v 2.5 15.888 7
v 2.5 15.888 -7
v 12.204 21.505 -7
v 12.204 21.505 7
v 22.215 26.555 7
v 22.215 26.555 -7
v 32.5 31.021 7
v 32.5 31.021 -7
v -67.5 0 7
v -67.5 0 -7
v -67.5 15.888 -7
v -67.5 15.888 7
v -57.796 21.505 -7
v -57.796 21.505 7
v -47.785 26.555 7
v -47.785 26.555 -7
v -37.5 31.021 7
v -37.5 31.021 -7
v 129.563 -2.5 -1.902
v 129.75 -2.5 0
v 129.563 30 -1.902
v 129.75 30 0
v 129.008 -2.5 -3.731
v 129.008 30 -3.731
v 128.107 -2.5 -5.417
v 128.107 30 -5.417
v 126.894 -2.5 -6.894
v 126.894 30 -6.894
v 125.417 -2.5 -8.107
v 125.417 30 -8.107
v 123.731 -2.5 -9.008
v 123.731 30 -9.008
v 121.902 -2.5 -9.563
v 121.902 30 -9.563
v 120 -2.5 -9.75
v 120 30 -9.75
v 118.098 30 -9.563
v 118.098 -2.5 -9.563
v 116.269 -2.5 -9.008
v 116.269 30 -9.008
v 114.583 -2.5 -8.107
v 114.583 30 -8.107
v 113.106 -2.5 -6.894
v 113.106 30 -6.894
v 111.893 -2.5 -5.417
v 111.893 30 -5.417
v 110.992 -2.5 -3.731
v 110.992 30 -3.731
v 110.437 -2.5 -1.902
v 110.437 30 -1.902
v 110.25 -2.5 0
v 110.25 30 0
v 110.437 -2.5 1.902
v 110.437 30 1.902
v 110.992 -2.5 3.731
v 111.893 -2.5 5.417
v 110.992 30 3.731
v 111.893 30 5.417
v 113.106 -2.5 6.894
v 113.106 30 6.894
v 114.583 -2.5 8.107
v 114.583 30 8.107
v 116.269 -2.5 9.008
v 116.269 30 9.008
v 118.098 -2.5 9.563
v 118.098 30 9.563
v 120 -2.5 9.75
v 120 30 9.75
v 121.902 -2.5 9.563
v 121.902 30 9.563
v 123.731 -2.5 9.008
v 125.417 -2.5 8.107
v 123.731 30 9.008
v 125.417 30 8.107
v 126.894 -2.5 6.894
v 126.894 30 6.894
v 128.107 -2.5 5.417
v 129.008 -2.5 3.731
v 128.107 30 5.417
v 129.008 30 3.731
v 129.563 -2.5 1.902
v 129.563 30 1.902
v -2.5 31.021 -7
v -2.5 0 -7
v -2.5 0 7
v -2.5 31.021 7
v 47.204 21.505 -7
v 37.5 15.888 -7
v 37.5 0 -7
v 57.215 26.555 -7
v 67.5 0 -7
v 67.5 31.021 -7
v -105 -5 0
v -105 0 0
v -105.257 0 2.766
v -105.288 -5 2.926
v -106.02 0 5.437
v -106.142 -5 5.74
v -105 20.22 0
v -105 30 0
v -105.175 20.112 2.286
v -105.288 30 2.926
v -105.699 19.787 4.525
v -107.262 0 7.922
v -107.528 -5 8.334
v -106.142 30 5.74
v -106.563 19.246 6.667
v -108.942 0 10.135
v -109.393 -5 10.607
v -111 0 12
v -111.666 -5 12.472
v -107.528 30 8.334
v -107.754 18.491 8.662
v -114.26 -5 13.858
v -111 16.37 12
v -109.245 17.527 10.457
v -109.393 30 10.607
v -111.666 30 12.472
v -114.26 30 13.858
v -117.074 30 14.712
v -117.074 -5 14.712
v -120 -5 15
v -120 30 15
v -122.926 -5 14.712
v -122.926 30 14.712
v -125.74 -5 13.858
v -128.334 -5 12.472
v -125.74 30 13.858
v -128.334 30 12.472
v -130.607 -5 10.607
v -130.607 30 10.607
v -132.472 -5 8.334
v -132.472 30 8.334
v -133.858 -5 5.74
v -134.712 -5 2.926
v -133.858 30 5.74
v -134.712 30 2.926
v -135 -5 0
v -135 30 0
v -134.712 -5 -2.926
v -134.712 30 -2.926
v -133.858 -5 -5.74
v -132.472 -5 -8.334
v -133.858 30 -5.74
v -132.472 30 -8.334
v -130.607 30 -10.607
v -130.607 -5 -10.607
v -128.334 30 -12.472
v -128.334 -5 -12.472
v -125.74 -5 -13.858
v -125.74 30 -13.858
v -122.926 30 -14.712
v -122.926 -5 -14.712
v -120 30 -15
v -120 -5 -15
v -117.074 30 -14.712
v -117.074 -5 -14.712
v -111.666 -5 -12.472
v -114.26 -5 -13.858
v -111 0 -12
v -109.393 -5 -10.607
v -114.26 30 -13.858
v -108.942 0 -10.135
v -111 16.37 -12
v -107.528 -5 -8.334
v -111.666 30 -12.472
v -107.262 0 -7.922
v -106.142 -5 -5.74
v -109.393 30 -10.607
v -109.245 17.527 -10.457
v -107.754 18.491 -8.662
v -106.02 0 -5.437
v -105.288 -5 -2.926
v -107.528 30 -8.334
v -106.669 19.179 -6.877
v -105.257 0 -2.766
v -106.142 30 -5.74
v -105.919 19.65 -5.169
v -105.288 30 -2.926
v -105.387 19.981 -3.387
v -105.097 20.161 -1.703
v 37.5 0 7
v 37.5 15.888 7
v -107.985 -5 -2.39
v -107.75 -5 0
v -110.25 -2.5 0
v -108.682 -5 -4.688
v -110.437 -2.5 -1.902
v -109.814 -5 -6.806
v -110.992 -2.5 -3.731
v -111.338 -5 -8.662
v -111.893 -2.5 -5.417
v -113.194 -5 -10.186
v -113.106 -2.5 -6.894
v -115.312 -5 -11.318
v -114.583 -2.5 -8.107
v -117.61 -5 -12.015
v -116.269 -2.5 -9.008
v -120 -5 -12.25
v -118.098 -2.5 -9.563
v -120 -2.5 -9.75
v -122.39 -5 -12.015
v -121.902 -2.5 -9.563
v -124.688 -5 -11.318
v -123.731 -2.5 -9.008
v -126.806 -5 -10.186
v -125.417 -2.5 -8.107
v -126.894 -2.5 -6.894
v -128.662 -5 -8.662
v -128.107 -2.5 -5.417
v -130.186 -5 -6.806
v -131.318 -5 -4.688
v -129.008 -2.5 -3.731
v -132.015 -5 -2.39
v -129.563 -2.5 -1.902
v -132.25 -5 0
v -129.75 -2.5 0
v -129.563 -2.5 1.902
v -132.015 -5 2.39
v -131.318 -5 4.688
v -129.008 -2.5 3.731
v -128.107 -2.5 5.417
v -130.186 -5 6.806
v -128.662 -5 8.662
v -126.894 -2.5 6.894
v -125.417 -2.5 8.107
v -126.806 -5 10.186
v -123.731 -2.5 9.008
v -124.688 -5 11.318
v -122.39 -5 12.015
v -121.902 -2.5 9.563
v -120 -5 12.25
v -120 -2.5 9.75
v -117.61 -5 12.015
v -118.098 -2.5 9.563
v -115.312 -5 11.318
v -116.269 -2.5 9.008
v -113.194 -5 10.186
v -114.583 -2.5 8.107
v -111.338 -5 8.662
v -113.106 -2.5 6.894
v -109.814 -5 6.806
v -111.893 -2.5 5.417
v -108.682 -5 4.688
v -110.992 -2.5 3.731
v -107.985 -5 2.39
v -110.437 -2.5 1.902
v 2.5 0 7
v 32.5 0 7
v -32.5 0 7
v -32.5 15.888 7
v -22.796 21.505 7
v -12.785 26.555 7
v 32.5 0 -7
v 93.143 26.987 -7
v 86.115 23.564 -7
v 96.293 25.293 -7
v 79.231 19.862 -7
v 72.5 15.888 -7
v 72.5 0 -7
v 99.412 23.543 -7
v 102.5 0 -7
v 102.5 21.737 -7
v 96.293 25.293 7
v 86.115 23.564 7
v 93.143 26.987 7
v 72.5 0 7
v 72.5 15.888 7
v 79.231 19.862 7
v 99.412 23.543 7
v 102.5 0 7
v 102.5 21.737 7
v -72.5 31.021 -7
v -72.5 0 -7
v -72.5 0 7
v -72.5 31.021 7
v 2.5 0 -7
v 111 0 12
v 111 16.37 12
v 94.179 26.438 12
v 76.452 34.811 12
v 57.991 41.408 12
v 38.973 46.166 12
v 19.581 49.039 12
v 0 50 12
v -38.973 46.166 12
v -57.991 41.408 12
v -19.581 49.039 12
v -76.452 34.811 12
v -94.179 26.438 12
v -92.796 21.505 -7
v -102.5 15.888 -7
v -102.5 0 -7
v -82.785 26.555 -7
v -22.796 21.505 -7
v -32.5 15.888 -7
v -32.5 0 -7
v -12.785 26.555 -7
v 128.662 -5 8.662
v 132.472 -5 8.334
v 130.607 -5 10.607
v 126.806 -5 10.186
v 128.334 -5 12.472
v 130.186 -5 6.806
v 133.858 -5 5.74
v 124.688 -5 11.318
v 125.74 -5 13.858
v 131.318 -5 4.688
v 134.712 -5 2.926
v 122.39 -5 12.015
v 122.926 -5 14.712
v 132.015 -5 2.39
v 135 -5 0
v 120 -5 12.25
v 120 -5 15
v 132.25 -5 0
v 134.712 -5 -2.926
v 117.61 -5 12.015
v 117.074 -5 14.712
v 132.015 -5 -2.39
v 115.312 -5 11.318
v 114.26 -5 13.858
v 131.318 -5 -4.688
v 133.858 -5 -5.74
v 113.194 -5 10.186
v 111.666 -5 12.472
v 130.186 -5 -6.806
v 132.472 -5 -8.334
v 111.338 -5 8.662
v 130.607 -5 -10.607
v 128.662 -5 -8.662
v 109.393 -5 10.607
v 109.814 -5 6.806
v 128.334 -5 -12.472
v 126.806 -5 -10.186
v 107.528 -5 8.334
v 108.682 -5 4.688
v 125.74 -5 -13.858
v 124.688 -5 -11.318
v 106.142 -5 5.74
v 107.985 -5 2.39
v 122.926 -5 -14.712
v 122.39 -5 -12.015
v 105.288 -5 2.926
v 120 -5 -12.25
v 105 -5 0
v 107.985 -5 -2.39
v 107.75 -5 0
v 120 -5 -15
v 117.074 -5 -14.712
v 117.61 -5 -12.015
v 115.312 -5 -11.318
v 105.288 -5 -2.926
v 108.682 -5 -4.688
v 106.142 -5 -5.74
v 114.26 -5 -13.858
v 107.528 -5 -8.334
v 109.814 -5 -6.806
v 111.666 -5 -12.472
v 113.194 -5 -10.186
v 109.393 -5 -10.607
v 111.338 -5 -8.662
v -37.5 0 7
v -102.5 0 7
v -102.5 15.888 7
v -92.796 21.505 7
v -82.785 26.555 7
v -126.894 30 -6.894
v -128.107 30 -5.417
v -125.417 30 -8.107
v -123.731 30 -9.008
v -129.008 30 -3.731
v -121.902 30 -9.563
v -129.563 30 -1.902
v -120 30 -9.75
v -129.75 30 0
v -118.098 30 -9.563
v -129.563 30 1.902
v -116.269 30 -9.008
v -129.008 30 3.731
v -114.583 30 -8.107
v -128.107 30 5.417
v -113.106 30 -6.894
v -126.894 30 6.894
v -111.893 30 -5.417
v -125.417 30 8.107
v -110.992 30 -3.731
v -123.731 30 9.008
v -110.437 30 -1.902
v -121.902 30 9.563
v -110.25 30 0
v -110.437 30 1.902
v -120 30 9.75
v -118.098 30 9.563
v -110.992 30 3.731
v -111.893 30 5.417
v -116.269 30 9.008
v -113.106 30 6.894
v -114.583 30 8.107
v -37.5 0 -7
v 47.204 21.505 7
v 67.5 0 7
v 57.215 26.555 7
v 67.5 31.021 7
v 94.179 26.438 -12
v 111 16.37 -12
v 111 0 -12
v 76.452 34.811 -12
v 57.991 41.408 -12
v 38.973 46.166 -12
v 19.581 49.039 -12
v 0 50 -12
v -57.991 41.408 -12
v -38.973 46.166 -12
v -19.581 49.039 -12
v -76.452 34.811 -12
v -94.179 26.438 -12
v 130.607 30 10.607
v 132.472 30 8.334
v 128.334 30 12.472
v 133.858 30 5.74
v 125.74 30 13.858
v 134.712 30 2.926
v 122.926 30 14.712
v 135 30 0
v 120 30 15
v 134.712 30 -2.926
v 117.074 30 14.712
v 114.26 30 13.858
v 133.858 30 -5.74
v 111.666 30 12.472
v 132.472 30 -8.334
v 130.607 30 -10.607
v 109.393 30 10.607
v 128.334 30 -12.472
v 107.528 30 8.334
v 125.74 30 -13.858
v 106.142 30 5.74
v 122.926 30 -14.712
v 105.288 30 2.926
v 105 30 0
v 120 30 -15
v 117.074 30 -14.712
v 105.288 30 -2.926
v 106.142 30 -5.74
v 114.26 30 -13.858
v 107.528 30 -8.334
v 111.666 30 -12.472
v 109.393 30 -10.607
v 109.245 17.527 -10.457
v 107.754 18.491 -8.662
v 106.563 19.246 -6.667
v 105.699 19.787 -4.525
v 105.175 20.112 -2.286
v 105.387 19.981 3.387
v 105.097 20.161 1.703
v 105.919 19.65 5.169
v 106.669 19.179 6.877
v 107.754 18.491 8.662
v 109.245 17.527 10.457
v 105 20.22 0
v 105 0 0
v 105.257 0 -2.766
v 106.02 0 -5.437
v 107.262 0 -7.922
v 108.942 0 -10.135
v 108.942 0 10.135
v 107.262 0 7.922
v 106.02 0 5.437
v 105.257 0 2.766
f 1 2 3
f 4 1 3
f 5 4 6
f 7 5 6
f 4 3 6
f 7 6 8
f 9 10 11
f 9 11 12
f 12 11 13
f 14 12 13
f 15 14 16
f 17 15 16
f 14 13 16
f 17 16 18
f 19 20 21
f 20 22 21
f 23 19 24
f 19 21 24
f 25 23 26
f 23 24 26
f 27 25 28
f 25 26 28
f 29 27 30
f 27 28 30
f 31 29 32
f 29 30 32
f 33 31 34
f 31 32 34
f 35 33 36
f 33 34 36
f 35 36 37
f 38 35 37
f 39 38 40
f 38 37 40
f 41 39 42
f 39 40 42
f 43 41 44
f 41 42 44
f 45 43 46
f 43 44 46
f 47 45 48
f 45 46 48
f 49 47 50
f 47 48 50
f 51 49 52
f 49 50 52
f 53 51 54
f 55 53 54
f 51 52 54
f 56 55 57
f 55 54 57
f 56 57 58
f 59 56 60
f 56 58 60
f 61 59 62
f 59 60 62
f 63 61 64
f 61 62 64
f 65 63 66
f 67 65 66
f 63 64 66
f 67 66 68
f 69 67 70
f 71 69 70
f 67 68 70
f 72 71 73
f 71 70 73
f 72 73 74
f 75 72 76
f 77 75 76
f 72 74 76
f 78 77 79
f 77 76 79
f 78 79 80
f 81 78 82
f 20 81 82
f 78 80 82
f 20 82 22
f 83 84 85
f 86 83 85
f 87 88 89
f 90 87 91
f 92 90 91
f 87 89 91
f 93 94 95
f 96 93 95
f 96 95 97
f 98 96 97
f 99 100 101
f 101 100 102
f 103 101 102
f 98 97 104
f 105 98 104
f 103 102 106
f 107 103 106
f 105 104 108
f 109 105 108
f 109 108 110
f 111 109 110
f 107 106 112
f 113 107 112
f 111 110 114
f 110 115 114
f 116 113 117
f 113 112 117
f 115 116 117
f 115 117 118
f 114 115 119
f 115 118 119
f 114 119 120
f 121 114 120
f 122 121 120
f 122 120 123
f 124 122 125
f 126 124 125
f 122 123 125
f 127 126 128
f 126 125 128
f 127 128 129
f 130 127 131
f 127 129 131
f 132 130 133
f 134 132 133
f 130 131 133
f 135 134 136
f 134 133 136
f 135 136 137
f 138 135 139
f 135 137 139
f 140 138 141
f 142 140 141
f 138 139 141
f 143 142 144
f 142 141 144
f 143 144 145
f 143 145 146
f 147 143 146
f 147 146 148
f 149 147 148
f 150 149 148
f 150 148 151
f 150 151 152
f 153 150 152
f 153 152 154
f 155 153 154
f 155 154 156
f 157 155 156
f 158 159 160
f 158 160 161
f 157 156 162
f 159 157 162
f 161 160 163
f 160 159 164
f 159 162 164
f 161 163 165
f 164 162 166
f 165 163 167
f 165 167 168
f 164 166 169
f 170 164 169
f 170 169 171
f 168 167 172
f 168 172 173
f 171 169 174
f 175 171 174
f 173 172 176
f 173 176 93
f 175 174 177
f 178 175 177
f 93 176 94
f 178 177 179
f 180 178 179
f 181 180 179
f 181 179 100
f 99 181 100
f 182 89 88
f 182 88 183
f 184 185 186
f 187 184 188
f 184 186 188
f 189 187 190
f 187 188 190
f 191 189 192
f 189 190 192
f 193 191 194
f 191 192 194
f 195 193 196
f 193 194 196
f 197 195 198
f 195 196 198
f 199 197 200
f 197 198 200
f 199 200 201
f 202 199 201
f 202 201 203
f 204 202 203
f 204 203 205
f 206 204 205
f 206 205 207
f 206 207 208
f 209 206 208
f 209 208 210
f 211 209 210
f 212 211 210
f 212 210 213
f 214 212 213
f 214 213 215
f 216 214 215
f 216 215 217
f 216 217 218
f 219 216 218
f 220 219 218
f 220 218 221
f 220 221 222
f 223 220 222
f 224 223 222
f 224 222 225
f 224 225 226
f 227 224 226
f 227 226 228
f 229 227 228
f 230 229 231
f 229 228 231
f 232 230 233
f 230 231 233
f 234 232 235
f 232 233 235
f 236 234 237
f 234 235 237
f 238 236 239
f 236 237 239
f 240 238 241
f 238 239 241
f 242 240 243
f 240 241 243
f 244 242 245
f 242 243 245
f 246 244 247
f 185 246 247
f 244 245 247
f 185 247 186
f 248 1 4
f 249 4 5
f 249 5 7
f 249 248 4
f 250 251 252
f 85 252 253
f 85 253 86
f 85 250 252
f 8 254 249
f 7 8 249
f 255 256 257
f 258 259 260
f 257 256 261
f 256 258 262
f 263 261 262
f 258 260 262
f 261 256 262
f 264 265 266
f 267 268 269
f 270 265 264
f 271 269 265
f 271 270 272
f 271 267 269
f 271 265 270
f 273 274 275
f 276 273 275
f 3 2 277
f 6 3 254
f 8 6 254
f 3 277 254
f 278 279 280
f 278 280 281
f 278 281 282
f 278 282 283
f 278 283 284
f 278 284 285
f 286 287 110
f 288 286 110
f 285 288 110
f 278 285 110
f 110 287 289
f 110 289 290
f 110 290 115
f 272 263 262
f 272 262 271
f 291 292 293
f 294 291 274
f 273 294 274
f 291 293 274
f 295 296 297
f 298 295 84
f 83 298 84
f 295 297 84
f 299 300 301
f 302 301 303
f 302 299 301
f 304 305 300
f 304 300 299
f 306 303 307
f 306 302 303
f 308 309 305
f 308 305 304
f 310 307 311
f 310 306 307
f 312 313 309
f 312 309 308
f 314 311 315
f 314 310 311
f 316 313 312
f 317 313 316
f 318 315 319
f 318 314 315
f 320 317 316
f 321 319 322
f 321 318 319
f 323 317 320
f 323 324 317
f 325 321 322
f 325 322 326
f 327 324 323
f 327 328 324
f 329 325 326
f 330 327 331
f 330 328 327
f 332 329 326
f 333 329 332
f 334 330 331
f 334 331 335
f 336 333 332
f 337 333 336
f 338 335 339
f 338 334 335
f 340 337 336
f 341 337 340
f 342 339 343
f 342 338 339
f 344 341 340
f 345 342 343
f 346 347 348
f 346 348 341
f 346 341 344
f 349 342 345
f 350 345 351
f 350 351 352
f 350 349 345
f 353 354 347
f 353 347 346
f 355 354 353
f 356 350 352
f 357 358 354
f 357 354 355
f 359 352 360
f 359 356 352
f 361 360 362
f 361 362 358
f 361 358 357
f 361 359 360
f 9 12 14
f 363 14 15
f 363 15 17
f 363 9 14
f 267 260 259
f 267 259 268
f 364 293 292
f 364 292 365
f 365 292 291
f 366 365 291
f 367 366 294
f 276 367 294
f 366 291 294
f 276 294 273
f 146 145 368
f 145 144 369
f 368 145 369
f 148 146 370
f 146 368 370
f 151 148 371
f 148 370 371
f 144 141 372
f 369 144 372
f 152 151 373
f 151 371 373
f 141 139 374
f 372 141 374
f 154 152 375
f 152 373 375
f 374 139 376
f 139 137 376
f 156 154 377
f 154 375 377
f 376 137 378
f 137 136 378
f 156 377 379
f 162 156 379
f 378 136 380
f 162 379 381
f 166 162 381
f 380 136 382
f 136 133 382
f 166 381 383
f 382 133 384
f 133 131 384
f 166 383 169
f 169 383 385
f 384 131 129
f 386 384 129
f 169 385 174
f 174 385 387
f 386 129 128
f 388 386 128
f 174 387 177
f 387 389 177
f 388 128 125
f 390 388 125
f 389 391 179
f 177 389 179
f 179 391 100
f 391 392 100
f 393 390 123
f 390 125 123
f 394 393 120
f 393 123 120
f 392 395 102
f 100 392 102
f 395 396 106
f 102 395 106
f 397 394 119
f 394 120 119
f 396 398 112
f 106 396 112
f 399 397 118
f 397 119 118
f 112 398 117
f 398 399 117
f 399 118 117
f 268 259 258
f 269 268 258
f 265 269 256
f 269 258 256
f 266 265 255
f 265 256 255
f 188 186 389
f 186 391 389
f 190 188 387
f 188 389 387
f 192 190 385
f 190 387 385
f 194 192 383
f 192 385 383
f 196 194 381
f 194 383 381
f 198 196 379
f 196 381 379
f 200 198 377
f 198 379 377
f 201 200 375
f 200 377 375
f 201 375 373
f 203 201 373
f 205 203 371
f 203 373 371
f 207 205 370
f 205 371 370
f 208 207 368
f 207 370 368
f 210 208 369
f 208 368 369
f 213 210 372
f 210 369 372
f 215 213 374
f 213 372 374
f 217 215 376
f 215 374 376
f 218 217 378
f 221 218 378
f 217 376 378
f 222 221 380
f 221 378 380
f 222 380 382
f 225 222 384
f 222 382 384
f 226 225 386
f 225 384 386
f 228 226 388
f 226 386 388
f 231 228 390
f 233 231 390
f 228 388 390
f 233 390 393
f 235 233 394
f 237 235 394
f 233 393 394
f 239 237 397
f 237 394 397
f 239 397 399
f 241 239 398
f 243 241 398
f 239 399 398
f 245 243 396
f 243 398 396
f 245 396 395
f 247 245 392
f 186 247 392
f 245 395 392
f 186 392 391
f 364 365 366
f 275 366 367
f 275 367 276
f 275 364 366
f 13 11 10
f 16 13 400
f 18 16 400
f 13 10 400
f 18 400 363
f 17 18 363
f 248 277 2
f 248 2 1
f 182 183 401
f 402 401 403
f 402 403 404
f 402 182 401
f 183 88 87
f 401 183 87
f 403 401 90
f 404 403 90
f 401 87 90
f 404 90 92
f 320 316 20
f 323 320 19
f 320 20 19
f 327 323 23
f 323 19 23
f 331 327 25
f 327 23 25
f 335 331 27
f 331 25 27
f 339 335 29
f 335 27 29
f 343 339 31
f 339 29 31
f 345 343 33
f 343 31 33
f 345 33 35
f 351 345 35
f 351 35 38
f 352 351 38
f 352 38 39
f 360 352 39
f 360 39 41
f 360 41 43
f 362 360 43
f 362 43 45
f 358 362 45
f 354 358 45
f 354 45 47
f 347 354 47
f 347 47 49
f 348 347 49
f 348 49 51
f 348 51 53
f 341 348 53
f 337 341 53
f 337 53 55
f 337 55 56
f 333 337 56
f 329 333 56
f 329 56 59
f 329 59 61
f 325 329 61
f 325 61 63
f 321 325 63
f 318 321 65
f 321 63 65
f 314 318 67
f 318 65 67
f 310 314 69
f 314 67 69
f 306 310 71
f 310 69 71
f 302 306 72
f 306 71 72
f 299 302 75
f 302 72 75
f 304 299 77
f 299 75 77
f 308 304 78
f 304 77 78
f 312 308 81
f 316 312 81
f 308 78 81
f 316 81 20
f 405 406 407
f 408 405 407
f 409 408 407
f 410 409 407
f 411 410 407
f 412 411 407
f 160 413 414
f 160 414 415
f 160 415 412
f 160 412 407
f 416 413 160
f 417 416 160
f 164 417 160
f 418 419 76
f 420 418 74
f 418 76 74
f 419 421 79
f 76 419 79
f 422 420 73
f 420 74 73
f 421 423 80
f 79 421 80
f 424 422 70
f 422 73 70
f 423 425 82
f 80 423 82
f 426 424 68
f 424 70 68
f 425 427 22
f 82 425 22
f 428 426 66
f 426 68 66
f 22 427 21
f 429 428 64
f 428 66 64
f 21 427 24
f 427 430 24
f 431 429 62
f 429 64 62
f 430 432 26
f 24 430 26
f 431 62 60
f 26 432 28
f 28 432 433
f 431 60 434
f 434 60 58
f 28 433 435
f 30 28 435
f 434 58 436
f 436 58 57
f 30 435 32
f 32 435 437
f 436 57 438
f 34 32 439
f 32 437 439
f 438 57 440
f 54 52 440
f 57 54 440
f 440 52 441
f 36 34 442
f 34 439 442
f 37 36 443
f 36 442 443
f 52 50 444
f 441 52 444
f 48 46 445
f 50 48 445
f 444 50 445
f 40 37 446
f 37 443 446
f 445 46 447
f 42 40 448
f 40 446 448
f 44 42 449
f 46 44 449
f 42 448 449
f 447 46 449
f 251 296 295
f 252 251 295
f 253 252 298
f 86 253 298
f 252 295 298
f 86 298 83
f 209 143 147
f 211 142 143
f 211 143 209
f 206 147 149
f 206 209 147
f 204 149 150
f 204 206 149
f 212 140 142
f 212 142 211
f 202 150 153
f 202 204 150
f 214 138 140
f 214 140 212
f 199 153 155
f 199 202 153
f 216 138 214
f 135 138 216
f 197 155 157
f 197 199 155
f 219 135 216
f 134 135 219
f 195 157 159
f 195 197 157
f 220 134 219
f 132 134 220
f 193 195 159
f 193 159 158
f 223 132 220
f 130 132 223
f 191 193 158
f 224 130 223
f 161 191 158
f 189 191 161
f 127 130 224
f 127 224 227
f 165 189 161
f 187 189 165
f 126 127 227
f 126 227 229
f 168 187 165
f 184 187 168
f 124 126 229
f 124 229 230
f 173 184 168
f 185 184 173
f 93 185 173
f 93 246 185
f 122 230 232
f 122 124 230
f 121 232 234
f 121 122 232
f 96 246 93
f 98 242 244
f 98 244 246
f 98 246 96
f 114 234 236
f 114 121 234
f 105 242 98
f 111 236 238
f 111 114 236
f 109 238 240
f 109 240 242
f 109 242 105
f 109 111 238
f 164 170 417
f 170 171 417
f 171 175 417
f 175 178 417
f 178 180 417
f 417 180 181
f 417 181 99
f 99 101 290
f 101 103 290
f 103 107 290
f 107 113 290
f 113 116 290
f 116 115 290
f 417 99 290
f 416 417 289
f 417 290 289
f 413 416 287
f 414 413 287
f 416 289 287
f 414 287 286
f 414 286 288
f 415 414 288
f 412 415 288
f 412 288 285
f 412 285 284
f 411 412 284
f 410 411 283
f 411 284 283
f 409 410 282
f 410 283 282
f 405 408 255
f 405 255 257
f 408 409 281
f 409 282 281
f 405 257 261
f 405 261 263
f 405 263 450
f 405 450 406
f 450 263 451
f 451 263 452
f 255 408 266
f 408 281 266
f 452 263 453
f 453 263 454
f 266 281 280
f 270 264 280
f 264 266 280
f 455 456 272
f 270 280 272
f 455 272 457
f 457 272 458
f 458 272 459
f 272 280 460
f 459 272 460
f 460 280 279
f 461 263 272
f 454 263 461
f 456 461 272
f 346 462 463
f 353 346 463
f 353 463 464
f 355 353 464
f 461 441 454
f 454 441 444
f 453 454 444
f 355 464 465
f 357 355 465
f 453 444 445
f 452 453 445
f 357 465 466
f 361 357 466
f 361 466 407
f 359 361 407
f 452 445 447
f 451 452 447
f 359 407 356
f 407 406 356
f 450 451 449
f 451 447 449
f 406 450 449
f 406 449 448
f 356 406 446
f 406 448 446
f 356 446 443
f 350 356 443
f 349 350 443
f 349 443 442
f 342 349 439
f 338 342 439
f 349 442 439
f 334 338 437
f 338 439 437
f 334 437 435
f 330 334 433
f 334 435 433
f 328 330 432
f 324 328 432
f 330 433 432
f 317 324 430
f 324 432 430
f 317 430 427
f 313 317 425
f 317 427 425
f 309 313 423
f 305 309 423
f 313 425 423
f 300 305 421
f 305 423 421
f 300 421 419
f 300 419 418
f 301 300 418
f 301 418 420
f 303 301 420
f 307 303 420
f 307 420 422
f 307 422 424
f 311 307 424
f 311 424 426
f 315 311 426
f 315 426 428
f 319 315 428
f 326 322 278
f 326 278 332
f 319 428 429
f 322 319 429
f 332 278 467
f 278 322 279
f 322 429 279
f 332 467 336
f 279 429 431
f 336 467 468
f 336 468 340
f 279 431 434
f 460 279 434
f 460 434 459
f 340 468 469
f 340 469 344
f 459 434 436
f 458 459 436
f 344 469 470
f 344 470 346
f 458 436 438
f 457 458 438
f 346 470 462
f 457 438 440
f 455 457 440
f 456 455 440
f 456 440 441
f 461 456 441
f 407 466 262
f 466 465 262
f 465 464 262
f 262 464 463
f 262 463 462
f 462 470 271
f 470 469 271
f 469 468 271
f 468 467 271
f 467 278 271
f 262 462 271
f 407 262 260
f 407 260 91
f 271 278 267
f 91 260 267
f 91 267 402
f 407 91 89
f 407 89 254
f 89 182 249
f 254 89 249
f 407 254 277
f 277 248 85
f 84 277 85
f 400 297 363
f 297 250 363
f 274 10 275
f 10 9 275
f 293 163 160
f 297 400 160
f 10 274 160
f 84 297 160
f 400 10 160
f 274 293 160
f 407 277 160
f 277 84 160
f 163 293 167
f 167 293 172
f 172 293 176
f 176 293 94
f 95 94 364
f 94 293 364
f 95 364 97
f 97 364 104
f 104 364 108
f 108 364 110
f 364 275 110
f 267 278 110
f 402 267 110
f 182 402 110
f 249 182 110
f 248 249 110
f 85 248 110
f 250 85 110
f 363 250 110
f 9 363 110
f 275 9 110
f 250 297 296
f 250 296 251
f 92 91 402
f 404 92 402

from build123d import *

# Parameters (mm, degrees)
EXTRUDE_2_DEPTH              = 12
EXTRUDE_3_DEPTH              = 5
EXTRUDE_3_DEPTH_BACK         = 30
SKETCH_4_R                   = 15
CUT_EXTRUDE_2_REACH          = 146.741
CUT_EXTRUDE_2_END_RADIUS     = 195
SKETCH_5_W                   = 30
SKETCH_5_H                   = 14
PATTERN_LINEAR_1_COUNT       = 6
PATTERN_LINEAR_1_PITCH       = 35
HOLE_WIZARD_M221_D           = 19.5
HOLE_WIZARD_M221_CSINK_D     = 24.5
HOLE_WIZARD_M221_CSINK_ANGLE = 90


with BuildPart() as part:
    # Эскиз2 → Бобышка-Вытянуть2 (new, symmetric)
    with BuildSketch(Plane.XY):
        with BuildLine():
            Line((120, 0), (-120, 0))
            Line((-120, 0), (-120, 10))
            ThreePointArc((-120, 10), (0, 50), (120, 10))
            Line((120, 10), (120, 0))
        make_face()
    extrude(amount=EXTRUDE_2_DEPTH, both=True)

    # Эскиз4 → Бобышка-Вытянуть3 (add, two sides: drawn at the far end of the back side and taken through both)
    with BuildSketch(Plane.XZ.offset(-EXTRUDE_3_DEPTH_BACK)):
        with Locations((-120, 0)):
            Circle(SKETCH_4_R)
        with Locations(Location((120, 0, 0), (0, 0, 180))):
            Circle(SKETCH_4_R)
    extrude(amount=EXTRUDE_3_DEPTH + EXTRUDE_3_DEPTH_BACK)

    # Вырез-Вытянуть2: up to this cylinder (the profile starts inside it)
    cut_extrude_2_end = Plane(origin=(0, -150, 0), z_dir=(0, 0, -1)) * Cylinder(CUT_EXTRUDE_2_END_RADIUS, 684.482, mode=Mode.PRIVATE)
    # Эскиз5 → Вырез-Вытянуть2 (cut, up to the surface)
    with BuildSketch(Plane.XZ, mode=Mode.PRIVATE) as cut_extrude_2_sk1:
        with Locations((-87.5, 0)):
            Rectangle(SKETCH_5_W, SKETCH_5_H)
    cut_extrude_2_tool1 = extrude(cut_extrude_2_sk1.sketch, amount=-CUT_EXTRUDE_2_REACH, mode=Mode.PRIVATE) & cut_extrude_2_end
    cut_extrude_2 = cut_extrude_2_tool1.solids().sort_by_distance((-87.5, 0, 0))[0]
    add(cut_extrude_2, mode=Mode.SUBTRACT)

    # Линейный массив1: Вырез-Вытянуть2 ×6
    with Locations(*[(i * PATTERN_LINEAR_1_PITCH, 0, 0) for i in range(1, PATTERN_LINEAR_1_COUNT)]):
        add(cut_extrude_2, mode=Mode.SUBTRACT)

    # Отверстие обработанное метчиком M221 (through all)
    with Locations(Plane(origin=(0, -5, 0), x_dir=(-1, 0, 0), z_dir=(0, -1, 0))):
        with Locations((-120, 0), (120, 0)):
            CounterSinkHole(HOLE_WIZARD_M221_D / 2, HOLE_WIZARD_M221_CSINK_D / 2, counter_sink_angle=HOLE_WIZARD_M221_CSINK_ANGLE)


solid = part.part
